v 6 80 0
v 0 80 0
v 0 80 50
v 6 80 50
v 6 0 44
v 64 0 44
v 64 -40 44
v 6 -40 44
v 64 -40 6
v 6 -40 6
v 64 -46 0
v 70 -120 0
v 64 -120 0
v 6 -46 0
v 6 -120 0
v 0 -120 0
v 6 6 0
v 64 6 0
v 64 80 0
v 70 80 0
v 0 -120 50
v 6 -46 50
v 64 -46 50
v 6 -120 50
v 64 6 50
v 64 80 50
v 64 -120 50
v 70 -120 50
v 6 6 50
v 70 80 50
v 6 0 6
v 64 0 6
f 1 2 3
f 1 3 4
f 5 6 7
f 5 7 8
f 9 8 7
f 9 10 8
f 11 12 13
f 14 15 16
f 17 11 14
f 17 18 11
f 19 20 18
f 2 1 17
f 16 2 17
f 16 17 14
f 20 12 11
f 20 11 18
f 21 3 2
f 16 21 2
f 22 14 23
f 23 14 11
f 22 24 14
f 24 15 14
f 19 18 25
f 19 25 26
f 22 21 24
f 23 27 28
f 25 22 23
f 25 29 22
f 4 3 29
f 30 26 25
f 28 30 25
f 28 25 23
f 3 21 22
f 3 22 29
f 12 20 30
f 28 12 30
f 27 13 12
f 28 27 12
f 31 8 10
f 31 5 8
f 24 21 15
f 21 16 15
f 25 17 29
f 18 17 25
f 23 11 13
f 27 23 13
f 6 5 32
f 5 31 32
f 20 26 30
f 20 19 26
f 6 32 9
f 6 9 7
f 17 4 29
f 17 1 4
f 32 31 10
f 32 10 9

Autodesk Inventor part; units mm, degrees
ref_plane "YZ Plane" through (0, 0, 0) normal (1, 0, 0) x (0, 1, 0)
ref_plane "XZ Plane" through (0, 0, 0) normal (0, 1, 0) x (-1, 0, 0)
ref_plane "XY Plane" through (0, 0, 0) normal (0, 0, 1) x (1, 0, 0)
sketch "Sketch1" plane through (0, 0, 0) normal (0, 0, 1) x (1, 0, 0)
  line L0 (0, 80) -> (0, 0)
  line L1 (0, 0) -> (70, 0)
  line L2 (70, 0) -> (70, 80)
  line L3 (6, 80) -> (6, 6)
  line L4 (6, 6) -> (64, 6)
  line L5 (64, 6) -> (64, 80)
  line L6 (0, 80) -> (6, 80)
  line L7 (64, 80) -> (70, 80)
  line L8 (0, -20) -> (70, -20)
  line L9 (0, -120) -> (0, -40)
  line L10 (0, -40) -> (70, -40)
  line L11 (70, -40) -> (70, -120)
  line L12 (6, -120) -> (6, -46)
  line L13 (6, -46) -> (64, -46)
  line L14 (64, -46) -> (64, -120)
  line L15 (0, -120) -> (6, -120)
  line L16 (64, -120) -> (70, -120)
  dimension "d0" = 70
  dimension "d1" = 80
  dimension "d2" = 80
  dimension "d3" = 6
  dimension "d10" = 20
extrude "Extrusion1" add sketch "Sketch1" along normal blind 50
sketch "Sketch2" plane through (0, 0, 0) normal (0, -1, 0) x (1, 0, 0)
  line L0 (6, 0) -> (0, 0) projected
  line L1 (0, 50) -> (70, 50) projected
  line L2 (0, 0) -> (70, 0)
  line L3 (70, 0) -> (70, 50)
  line L4 (70, 50) -> (0, 50)
  line L5 (0, 50) -> (0, 0)
  line L6 (6, 6) -> (64, 6)
  line L7 (64, 6) -> (64, 44)
  line L8 (64, 44) -> (6, 44)
  line L9 (6, 44) -> (6, 6)
  dimension "d7" = 6
extrude "Extrusion2" add sketch "Sketch2" along normal blind 40
properties part number "armj3"
